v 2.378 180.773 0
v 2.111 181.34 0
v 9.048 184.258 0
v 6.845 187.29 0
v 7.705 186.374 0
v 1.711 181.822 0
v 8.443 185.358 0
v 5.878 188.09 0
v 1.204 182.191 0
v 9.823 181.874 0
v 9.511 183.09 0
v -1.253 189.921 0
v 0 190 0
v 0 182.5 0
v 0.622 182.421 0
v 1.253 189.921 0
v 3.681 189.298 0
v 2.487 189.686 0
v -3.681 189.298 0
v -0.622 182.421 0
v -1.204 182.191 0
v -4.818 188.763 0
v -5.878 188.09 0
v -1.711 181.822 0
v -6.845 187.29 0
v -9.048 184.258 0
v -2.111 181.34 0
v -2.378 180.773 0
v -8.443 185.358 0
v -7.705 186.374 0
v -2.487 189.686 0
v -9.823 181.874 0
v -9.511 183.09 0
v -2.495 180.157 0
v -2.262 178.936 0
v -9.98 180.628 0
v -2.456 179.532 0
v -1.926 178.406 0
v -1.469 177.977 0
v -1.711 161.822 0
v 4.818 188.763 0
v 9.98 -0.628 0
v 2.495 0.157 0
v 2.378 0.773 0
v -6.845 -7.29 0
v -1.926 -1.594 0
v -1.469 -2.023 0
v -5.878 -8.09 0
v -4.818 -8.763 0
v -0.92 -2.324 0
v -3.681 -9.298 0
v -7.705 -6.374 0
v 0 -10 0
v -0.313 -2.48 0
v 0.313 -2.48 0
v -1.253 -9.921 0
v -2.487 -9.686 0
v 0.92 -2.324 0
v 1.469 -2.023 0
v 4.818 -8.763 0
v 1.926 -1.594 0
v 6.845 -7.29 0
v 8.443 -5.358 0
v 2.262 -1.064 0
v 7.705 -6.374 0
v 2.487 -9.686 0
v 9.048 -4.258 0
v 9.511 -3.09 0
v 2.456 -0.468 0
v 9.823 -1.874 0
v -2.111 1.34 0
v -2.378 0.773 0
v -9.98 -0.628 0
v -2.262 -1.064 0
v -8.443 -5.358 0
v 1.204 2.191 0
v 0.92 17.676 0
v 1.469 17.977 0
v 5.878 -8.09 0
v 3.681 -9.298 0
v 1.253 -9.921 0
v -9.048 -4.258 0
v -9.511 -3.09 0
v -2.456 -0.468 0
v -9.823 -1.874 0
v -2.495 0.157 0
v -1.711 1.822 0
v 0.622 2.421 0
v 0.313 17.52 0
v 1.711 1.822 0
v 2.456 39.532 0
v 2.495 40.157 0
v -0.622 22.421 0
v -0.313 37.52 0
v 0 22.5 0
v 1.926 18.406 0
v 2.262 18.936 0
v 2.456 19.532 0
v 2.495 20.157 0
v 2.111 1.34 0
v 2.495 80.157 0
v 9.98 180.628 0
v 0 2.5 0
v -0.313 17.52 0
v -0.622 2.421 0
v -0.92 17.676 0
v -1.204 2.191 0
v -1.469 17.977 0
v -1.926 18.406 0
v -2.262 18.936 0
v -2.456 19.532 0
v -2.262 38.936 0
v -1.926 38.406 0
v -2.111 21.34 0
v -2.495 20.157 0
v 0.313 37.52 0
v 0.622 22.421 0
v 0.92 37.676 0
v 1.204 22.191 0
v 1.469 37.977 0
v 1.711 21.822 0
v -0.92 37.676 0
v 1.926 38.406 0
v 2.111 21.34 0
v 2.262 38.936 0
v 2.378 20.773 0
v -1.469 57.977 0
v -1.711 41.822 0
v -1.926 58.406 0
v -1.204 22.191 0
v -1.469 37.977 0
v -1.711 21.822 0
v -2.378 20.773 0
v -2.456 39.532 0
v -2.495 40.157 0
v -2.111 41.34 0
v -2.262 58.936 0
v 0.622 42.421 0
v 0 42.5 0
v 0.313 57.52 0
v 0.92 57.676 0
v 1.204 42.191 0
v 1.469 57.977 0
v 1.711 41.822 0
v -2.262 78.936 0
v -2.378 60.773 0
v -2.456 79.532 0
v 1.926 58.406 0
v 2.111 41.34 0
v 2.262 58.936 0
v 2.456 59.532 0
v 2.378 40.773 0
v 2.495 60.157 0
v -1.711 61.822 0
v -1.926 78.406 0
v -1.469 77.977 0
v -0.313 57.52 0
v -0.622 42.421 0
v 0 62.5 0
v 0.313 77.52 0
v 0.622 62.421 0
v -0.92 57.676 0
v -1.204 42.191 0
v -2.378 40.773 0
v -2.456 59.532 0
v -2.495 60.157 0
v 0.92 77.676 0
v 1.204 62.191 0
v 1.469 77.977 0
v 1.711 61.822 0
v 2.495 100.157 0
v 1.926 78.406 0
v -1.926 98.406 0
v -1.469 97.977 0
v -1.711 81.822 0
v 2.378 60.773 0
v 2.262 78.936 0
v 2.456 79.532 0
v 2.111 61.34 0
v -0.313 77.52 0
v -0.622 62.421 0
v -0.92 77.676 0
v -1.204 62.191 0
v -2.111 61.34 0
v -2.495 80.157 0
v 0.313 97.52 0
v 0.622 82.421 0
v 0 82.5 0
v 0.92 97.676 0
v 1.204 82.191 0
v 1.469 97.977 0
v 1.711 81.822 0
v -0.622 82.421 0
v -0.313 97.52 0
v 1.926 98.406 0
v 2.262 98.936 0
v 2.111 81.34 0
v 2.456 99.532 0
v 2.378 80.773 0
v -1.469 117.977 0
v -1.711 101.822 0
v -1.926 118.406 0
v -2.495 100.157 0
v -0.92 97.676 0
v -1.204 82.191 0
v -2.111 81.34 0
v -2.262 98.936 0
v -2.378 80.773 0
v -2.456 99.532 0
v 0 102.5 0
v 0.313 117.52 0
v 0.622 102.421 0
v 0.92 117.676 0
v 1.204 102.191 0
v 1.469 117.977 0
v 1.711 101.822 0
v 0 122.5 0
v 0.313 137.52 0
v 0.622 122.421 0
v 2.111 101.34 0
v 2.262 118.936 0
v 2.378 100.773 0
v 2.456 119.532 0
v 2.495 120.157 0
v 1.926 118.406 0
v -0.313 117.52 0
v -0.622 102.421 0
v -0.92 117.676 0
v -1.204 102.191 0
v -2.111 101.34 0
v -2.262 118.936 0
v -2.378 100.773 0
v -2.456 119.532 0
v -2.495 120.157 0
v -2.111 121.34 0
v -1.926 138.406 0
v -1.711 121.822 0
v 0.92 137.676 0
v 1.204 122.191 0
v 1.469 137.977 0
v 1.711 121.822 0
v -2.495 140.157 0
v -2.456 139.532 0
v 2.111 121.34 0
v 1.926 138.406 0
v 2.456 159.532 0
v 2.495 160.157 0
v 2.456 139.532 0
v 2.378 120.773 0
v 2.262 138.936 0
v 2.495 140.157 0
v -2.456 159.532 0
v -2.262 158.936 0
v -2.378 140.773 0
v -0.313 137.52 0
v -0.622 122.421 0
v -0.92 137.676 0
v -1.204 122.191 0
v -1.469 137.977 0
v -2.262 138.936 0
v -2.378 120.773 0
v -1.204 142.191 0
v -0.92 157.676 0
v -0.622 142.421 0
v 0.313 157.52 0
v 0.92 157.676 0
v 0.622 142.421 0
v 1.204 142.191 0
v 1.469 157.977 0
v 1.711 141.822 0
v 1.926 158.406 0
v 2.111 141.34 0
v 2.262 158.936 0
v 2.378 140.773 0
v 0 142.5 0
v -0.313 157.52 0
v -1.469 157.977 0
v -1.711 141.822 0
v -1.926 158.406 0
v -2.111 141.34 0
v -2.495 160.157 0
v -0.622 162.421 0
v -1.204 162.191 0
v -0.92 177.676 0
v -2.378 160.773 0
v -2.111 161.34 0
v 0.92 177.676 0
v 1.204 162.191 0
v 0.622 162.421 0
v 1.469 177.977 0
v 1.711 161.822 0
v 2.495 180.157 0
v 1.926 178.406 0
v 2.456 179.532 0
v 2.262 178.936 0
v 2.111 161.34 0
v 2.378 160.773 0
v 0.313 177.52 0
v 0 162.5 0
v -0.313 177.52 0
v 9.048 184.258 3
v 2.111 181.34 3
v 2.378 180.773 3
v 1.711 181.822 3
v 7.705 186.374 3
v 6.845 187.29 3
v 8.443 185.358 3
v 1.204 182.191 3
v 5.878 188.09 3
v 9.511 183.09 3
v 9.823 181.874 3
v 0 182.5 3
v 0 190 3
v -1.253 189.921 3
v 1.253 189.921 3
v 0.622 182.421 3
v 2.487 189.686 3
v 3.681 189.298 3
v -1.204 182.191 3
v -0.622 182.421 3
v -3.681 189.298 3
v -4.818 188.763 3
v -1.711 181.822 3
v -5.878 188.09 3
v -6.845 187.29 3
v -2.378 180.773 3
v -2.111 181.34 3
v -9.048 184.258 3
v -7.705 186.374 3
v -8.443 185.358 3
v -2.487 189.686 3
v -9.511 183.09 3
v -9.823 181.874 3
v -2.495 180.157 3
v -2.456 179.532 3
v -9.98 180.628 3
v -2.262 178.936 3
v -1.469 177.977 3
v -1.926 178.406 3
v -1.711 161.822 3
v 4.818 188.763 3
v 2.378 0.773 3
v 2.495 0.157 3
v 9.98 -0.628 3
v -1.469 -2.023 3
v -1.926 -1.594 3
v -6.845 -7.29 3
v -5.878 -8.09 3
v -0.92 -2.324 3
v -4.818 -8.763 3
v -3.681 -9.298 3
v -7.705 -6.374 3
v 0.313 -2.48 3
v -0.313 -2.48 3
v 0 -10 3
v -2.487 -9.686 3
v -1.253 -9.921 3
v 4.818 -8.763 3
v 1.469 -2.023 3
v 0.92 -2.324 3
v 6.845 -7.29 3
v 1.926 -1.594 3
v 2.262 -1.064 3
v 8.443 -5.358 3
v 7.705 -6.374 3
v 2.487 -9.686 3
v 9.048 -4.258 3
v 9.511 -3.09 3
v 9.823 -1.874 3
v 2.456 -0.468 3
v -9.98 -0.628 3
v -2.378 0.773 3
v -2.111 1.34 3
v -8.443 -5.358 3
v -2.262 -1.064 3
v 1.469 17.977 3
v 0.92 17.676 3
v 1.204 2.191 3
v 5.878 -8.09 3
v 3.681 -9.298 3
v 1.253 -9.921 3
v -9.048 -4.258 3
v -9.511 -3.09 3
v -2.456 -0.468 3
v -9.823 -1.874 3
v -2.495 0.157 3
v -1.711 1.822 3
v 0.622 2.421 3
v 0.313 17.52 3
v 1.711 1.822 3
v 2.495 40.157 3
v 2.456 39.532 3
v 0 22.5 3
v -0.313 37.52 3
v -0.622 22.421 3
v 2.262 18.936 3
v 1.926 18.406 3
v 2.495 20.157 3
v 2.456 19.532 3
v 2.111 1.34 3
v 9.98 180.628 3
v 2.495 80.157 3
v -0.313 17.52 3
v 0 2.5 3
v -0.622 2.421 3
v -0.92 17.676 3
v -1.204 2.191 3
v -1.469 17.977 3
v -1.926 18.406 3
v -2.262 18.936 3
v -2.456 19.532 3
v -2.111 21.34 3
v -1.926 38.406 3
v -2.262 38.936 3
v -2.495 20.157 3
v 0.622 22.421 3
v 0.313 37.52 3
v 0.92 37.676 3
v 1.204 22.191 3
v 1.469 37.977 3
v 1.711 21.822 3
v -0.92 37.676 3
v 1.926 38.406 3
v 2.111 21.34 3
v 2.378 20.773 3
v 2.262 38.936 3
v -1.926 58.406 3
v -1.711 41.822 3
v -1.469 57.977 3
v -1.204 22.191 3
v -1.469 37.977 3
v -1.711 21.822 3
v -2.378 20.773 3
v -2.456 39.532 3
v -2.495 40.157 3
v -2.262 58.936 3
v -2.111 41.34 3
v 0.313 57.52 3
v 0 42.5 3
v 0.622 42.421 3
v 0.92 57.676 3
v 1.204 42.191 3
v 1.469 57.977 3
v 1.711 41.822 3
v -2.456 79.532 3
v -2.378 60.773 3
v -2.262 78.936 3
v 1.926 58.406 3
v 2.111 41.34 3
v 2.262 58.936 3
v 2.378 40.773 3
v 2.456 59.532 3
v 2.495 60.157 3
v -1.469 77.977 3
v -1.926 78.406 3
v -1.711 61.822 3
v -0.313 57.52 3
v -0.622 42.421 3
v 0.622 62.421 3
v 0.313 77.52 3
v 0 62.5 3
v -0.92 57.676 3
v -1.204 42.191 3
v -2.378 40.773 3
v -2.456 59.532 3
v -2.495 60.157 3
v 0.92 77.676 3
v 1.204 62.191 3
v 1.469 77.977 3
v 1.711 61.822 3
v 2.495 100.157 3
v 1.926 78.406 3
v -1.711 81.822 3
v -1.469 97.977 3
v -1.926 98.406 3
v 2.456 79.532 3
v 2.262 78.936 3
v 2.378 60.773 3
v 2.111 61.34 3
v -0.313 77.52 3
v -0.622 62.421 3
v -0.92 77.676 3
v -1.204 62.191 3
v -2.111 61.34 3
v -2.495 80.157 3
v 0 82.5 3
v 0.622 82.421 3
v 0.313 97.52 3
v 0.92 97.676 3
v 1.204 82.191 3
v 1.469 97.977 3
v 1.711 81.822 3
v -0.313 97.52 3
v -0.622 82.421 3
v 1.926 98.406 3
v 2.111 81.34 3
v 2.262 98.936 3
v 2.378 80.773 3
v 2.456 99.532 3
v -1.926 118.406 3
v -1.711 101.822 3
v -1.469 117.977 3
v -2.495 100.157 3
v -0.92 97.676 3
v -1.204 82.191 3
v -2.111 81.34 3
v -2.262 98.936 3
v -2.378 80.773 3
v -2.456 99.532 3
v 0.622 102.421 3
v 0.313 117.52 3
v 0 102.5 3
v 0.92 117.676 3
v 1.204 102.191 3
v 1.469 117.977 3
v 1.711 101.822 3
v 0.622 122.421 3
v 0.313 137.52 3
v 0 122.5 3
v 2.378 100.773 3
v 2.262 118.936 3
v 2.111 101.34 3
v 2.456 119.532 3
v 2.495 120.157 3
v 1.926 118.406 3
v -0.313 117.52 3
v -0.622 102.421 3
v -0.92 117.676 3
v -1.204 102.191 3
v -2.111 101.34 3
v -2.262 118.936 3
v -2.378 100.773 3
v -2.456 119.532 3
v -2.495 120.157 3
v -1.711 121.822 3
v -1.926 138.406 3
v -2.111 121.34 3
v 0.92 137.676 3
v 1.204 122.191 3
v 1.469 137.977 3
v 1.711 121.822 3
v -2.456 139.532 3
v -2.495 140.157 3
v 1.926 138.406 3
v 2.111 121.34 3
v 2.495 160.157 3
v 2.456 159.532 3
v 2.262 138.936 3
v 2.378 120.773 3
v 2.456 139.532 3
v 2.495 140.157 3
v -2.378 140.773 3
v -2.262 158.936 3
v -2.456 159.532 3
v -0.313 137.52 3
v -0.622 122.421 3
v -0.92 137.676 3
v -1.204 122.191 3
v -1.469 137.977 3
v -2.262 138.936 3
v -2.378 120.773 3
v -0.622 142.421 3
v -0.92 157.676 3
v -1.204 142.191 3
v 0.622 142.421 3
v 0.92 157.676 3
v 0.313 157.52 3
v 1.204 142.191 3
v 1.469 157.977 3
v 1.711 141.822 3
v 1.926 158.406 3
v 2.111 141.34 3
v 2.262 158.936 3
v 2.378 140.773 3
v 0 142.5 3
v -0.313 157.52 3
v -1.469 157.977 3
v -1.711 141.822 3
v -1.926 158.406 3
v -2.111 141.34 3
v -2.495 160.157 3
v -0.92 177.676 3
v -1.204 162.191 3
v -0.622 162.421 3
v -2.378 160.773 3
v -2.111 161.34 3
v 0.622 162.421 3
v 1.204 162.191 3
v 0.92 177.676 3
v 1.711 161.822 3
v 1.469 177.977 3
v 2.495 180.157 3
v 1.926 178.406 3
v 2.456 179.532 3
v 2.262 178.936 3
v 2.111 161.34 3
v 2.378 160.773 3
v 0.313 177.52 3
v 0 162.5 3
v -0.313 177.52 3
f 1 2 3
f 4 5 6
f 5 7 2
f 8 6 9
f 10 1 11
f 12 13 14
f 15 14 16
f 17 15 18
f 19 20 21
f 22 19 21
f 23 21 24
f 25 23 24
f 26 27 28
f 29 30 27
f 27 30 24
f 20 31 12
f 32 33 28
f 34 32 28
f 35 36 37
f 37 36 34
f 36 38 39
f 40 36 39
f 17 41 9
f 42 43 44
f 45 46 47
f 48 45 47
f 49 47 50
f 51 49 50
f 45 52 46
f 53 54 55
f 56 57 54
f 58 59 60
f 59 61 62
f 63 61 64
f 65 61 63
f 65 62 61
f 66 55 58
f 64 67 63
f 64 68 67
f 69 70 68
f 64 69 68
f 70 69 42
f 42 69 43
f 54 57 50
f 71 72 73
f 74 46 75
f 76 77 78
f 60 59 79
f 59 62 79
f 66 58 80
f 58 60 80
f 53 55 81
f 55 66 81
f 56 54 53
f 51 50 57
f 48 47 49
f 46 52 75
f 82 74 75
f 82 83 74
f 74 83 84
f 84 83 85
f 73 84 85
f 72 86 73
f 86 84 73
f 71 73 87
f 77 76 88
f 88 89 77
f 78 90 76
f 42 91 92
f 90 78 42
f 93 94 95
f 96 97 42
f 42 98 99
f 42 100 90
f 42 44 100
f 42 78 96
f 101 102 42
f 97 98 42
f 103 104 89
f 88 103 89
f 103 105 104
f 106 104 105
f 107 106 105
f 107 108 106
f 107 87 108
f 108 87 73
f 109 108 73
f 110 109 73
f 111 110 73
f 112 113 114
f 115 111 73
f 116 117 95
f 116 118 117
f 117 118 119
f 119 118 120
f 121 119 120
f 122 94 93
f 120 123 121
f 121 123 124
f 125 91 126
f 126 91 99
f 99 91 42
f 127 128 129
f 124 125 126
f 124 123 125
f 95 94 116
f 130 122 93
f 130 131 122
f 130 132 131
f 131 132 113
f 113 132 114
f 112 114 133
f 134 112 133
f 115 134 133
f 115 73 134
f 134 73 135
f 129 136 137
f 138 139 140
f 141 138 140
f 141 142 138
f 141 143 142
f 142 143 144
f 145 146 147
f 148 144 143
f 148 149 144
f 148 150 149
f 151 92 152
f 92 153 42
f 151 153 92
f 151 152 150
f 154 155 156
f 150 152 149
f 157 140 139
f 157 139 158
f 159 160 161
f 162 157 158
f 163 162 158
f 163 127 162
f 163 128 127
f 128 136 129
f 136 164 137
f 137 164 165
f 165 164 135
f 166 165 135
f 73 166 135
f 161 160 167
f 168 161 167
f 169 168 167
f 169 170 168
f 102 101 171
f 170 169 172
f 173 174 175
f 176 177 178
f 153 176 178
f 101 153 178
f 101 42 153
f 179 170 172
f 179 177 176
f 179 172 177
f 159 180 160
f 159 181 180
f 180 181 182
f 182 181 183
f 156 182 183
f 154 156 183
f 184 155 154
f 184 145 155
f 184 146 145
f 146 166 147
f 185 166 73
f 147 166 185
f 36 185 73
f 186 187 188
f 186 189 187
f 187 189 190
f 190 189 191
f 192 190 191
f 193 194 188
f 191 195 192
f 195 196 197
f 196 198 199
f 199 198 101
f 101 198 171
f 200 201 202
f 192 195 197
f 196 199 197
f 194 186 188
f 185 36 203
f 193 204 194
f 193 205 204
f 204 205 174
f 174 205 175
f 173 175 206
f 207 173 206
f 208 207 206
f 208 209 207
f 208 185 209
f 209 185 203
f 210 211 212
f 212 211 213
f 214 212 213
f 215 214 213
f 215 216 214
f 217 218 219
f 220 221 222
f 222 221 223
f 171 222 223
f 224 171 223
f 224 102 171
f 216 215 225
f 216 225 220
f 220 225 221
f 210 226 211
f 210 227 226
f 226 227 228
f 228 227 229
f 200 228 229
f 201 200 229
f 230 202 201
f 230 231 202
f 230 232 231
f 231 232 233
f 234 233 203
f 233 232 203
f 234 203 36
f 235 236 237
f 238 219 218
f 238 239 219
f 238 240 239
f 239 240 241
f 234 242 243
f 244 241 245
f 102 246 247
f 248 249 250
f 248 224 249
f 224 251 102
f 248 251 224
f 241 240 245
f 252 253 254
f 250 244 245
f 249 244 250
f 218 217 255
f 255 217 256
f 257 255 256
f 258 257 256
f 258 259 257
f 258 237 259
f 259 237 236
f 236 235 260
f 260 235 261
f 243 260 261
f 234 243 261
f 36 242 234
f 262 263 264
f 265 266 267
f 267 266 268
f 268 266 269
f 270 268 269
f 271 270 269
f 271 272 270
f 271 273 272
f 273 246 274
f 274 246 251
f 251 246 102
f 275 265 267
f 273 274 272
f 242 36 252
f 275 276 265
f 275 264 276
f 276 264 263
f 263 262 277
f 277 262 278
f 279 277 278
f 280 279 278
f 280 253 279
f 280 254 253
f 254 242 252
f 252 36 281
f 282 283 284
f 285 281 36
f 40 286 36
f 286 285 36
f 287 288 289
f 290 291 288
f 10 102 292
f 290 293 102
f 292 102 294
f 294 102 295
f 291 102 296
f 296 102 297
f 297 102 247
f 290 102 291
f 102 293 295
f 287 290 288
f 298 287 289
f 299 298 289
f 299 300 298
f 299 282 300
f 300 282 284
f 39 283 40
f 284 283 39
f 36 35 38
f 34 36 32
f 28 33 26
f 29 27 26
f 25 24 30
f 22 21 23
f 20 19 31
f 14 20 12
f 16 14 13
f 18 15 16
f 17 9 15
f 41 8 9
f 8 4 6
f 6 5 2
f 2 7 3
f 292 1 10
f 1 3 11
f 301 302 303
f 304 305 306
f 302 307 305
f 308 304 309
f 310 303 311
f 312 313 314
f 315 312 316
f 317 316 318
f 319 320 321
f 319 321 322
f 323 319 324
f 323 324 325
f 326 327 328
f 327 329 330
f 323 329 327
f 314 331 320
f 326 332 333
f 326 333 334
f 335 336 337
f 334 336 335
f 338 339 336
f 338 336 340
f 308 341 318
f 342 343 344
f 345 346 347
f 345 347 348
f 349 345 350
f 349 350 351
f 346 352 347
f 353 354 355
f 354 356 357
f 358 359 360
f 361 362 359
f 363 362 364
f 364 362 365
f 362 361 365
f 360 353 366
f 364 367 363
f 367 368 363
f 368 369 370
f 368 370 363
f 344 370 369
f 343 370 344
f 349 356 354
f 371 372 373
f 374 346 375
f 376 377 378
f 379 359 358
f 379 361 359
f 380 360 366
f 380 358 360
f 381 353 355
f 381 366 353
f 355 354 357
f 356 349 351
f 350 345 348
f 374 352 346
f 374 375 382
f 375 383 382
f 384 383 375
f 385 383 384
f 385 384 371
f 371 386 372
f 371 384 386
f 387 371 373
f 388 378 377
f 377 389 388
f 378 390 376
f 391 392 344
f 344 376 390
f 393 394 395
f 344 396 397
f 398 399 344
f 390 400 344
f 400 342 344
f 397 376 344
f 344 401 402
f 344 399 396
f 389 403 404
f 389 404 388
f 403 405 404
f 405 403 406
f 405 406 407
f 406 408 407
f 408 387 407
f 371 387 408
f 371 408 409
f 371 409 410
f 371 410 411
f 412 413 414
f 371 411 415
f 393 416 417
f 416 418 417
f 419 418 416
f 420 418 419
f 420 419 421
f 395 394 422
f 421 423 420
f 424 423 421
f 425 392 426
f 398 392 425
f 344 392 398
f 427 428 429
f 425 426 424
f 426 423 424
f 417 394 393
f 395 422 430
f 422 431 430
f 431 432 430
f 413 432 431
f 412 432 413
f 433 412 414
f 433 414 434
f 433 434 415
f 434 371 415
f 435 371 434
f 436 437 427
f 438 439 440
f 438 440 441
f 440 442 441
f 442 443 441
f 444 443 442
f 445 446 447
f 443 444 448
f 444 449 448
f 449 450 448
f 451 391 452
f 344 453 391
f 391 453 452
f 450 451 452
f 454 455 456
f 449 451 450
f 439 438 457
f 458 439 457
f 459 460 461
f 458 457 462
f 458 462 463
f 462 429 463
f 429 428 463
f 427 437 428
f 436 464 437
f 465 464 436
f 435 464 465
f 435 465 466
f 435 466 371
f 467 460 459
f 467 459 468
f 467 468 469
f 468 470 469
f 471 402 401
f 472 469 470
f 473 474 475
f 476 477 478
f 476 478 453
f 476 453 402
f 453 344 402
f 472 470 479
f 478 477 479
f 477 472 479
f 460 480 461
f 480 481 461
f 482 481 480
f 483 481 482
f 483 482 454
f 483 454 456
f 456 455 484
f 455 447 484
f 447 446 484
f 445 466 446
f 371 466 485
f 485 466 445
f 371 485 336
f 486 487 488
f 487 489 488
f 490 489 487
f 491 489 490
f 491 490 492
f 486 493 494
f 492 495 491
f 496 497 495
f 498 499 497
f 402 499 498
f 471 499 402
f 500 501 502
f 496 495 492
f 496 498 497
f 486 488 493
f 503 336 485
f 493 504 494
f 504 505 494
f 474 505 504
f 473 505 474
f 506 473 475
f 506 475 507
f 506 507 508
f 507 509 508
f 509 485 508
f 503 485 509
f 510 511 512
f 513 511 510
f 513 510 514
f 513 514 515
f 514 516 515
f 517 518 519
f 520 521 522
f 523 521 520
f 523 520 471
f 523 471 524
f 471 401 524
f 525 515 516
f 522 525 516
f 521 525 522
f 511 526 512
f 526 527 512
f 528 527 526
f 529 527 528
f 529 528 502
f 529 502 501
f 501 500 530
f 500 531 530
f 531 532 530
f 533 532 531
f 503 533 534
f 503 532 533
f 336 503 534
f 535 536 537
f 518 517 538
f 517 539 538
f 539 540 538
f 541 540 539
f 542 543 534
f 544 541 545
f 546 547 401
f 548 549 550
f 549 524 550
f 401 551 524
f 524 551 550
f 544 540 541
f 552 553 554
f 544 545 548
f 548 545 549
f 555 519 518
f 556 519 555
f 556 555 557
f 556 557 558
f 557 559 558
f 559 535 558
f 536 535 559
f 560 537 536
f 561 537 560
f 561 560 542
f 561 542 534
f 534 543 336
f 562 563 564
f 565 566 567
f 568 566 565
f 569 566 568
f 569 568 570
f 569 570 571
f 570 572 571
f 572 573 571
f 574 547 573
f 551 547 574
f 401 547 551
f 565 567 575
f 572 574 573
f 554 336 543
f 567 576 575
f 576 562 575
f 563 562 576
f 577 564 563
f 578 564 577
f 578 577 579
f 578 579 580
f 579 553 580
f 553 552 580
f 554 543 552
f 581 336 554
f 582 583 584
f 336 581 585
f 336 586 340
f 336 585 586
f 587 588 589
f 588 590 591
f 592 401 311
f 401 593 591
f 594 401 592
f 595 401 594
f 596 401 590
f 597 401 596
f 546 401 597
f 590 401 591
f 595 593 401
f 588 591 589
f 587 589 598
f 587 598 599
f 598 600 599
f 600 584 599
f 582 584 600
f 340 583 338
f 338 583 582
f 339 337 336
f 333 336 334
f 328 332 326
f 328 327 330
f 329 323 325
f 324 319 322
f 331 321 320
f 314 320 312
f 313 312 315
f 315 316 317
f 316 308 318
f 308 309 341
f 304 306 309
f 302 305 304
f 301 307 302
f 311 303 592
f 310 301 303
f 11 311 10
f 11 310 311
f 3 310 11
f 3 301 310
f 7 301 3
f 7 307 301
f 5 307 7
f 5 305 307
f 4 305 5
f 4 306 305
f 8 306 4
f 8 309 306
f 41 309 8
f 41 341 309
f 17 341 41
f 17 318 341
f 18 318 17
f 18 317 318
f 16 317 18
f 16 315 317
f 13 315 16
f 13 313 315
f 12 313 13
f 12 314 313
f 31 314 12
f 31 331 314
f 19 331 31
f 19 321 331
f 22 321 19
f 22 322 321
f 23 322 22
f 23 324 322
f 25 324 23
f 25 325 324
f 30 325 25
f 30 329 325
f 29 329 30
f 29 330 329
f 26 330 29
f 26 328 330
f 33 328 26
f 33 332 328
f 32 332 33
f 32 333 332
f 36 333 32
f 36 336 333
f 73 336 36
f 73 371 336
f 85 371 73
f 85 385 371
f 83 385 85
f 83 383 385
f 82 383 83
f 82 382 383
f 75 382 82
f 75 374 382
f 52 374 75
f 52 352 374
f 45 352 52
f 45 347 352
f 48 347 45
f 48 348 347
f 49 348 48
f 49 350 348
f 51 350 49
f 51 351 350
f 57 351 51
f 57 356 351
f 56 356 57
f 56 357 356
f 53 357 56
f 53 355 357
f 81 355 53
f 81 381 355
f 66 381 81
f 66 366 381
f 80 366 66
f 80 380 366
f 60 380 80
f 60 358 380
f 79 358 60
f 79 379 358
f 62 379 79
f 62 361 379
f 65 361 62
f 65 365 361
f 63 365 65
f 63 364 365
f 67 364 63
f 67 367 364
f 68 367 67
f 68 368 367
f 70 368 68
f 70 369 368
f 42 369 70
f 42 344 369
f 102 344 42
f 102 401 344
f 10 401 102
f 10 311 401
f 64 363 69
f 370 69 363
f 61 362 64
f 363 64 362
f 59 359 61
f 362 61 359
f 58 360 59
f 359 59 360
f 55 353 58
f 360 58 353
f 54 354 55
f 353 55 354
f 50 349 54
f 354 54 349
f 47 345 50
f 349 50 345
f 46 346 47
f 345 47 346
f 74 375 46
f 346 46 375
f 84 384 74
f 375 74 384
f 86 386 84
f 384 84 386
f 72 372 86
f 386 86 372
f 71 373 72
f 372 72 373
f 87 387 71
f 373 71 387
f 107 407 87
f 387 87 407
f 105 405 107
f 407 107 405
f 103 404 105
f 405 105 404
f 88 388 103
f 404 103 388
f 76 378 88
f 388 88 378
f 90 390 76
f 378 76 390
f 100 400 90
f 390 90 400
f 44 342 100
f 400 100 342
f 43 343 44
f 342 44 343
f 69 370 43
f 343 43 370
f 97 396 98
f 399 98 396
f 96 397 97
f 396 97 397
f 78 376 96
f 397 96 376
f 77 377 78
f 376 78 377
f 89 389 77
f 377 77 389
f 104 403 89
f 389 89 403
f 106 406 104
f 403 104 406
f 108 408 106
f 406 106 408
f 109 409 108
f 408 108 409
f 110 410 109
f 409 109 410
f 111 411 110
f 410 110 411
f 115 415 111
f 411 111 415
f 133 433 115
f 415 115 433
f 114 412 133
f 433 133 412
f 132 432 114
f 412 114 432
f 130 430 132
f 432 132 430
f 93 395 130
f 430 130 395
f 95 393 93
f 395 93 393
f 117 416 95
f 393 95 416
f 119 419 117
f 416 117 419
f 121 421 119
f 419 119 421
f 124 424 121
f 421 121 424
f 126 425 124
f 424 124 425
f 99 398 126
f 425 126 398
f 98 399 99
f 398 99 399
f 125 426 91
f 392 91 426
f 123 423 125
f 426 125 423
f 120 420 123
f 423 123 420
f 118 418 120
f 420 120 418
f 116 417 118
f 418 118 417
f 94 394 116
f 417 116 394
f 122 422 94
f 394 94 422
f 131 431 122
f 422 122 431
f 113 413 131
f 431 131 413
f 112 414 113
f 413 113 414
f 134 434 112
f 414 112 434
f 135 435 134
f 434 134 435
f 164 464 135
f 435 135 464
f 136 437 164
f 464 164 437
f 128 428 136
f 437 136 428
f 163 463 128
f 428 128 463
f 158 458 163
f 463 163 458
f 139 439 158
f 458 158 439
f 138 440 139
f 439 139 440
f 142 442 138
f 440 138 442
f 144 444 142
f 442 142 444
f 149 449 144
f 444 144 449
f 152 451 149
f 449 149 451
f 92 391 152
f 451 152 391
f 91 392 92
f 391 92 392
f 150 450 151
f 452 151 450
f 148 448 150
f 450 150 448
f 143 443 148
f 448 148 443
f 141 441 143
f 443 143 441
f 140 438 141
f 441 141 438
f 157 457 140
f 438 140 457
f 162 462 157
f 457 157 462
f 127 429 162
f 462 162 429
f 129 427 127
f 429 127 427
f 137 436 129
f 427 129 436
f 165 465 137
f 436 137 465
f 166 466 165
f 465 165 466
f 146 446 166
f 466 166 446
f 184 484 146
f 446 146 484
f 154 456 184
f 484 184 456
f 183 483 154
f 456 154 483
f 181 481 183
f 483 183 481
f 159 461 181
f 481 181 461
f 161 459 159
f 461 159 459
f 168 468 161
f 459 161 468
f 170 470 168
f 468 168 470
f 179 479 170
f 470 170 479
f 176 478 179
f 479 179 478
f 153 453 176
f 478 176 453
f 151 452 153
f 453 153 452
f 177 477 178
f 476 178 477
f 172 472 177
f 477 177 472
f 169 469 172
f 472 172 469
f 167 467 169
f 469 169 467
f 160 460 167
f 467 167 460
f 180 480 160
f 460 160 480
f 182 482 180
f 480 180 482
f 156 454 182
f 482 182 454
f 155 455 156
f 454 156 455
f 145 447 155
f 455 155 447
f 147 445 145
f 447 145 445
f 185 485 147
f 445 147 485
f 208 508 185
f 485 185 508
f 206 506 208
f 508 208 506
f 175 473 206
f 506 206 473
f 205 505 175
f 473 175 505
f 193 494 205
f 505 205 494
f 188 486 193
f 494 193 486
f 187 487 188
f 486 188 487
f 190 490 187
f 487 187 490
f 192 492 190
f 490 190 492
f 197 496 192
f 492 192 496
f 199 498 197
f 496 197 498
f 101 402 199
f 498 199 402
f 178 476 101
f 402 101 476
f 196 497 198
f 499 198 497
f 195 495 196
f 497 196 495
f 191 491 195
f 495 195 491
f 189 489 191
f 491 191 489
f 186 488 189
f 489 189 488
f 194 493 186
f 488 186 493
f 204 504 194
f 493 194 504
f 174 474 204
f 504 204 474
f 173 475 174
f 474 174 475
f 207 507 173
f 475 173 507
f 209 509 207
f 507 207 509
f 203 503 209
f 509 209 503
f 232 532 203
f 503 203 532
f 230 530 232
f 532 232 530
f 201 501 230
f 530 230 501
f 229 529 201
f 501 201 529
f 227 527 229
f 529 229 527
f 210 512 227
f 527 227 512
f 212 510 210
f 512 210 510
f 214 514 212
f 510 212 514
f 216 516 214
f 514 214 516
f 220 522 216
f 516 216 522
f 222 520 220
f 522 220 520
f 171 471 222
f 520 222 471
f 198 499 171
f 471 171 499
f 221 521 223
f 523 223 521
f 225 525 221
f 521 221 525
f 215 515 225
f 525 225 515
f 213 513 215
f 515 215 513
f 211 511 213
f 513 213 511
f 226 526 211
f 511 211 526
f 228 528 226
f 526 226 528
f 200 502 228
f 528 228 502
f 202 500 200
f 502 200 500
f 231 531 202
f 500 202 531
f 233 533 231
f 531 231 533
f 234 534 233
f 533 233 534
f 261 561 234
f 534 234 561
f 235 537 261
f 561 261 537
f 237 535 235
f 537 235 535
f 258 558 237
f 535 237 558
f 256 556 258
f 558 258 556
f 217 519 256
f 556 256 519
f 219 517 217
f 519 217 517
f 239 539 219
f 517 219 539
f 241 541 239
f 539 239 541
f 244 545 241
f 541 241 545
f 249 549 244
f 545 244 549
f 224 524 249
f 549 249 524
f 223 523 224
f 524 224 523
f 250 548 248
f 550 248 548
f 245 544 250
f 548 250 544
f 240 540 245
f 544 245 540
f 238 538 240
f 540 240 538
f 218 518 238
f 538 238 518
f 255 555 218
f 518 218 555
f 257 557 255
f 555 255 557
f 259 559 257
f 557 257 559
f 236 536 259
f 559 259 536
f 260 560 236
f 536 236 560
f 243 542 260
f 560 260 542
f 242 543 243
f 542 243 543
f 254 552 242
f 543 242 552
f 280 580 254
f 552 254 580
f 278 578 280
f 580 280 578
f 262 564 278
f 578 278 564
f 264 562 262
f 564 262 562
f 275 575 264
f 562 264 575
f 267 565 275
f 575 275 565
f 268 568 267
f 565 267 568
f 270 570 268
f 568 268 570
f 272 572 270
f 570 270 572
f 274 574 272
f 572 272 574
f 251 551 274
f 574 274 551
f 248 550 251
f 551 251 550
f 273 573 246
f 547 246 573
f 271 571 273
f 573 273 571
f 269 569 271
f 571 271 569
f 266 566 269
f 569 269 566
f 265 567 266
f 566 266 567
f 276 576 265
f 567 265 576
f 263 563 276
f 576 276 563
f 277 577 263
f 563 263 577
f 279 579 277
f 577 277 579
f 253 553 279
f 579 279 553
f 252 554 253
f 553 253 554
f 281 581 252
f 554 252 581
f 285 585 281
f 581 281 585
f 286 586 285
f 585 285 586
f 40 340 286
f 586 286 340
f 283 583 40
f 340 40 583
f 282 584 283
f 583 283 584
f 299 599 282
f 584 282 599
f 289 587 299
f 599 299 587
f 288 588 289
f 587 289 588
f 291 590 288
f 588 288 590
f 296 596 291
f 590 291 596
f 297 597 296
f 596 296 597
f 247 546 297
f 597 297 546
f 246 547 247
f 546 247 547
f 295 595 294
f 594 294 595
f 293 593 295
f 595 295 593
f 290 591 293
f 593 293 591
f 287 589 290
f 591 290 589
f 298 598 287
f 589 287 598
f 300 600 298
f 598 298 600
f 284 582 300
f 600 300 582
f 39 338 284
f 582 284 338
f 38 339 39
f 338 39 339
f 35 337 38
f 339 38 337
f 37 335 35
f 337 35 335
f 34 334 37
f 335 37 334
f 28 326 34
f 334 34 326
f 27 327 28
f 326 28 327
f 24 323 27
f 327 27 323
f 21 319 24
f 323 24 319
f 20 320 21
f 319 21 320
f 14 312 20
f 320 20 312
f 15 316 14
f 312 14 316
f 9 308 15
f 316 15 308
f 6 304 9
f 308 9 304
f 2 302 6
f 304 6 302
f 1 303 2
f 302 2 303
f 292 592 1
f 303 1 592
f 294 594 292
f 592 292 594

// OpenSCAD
rotate([0,0,90]) linear_extrude(3) difference() {
  hull(){
    circle(d=20,$fn=50);
    translate([180,0]) circle(d=20,$fn=50);
  }
  for(x=[0:20:200]) translate([x,0]) circle(d=5,$fn=25);
}
